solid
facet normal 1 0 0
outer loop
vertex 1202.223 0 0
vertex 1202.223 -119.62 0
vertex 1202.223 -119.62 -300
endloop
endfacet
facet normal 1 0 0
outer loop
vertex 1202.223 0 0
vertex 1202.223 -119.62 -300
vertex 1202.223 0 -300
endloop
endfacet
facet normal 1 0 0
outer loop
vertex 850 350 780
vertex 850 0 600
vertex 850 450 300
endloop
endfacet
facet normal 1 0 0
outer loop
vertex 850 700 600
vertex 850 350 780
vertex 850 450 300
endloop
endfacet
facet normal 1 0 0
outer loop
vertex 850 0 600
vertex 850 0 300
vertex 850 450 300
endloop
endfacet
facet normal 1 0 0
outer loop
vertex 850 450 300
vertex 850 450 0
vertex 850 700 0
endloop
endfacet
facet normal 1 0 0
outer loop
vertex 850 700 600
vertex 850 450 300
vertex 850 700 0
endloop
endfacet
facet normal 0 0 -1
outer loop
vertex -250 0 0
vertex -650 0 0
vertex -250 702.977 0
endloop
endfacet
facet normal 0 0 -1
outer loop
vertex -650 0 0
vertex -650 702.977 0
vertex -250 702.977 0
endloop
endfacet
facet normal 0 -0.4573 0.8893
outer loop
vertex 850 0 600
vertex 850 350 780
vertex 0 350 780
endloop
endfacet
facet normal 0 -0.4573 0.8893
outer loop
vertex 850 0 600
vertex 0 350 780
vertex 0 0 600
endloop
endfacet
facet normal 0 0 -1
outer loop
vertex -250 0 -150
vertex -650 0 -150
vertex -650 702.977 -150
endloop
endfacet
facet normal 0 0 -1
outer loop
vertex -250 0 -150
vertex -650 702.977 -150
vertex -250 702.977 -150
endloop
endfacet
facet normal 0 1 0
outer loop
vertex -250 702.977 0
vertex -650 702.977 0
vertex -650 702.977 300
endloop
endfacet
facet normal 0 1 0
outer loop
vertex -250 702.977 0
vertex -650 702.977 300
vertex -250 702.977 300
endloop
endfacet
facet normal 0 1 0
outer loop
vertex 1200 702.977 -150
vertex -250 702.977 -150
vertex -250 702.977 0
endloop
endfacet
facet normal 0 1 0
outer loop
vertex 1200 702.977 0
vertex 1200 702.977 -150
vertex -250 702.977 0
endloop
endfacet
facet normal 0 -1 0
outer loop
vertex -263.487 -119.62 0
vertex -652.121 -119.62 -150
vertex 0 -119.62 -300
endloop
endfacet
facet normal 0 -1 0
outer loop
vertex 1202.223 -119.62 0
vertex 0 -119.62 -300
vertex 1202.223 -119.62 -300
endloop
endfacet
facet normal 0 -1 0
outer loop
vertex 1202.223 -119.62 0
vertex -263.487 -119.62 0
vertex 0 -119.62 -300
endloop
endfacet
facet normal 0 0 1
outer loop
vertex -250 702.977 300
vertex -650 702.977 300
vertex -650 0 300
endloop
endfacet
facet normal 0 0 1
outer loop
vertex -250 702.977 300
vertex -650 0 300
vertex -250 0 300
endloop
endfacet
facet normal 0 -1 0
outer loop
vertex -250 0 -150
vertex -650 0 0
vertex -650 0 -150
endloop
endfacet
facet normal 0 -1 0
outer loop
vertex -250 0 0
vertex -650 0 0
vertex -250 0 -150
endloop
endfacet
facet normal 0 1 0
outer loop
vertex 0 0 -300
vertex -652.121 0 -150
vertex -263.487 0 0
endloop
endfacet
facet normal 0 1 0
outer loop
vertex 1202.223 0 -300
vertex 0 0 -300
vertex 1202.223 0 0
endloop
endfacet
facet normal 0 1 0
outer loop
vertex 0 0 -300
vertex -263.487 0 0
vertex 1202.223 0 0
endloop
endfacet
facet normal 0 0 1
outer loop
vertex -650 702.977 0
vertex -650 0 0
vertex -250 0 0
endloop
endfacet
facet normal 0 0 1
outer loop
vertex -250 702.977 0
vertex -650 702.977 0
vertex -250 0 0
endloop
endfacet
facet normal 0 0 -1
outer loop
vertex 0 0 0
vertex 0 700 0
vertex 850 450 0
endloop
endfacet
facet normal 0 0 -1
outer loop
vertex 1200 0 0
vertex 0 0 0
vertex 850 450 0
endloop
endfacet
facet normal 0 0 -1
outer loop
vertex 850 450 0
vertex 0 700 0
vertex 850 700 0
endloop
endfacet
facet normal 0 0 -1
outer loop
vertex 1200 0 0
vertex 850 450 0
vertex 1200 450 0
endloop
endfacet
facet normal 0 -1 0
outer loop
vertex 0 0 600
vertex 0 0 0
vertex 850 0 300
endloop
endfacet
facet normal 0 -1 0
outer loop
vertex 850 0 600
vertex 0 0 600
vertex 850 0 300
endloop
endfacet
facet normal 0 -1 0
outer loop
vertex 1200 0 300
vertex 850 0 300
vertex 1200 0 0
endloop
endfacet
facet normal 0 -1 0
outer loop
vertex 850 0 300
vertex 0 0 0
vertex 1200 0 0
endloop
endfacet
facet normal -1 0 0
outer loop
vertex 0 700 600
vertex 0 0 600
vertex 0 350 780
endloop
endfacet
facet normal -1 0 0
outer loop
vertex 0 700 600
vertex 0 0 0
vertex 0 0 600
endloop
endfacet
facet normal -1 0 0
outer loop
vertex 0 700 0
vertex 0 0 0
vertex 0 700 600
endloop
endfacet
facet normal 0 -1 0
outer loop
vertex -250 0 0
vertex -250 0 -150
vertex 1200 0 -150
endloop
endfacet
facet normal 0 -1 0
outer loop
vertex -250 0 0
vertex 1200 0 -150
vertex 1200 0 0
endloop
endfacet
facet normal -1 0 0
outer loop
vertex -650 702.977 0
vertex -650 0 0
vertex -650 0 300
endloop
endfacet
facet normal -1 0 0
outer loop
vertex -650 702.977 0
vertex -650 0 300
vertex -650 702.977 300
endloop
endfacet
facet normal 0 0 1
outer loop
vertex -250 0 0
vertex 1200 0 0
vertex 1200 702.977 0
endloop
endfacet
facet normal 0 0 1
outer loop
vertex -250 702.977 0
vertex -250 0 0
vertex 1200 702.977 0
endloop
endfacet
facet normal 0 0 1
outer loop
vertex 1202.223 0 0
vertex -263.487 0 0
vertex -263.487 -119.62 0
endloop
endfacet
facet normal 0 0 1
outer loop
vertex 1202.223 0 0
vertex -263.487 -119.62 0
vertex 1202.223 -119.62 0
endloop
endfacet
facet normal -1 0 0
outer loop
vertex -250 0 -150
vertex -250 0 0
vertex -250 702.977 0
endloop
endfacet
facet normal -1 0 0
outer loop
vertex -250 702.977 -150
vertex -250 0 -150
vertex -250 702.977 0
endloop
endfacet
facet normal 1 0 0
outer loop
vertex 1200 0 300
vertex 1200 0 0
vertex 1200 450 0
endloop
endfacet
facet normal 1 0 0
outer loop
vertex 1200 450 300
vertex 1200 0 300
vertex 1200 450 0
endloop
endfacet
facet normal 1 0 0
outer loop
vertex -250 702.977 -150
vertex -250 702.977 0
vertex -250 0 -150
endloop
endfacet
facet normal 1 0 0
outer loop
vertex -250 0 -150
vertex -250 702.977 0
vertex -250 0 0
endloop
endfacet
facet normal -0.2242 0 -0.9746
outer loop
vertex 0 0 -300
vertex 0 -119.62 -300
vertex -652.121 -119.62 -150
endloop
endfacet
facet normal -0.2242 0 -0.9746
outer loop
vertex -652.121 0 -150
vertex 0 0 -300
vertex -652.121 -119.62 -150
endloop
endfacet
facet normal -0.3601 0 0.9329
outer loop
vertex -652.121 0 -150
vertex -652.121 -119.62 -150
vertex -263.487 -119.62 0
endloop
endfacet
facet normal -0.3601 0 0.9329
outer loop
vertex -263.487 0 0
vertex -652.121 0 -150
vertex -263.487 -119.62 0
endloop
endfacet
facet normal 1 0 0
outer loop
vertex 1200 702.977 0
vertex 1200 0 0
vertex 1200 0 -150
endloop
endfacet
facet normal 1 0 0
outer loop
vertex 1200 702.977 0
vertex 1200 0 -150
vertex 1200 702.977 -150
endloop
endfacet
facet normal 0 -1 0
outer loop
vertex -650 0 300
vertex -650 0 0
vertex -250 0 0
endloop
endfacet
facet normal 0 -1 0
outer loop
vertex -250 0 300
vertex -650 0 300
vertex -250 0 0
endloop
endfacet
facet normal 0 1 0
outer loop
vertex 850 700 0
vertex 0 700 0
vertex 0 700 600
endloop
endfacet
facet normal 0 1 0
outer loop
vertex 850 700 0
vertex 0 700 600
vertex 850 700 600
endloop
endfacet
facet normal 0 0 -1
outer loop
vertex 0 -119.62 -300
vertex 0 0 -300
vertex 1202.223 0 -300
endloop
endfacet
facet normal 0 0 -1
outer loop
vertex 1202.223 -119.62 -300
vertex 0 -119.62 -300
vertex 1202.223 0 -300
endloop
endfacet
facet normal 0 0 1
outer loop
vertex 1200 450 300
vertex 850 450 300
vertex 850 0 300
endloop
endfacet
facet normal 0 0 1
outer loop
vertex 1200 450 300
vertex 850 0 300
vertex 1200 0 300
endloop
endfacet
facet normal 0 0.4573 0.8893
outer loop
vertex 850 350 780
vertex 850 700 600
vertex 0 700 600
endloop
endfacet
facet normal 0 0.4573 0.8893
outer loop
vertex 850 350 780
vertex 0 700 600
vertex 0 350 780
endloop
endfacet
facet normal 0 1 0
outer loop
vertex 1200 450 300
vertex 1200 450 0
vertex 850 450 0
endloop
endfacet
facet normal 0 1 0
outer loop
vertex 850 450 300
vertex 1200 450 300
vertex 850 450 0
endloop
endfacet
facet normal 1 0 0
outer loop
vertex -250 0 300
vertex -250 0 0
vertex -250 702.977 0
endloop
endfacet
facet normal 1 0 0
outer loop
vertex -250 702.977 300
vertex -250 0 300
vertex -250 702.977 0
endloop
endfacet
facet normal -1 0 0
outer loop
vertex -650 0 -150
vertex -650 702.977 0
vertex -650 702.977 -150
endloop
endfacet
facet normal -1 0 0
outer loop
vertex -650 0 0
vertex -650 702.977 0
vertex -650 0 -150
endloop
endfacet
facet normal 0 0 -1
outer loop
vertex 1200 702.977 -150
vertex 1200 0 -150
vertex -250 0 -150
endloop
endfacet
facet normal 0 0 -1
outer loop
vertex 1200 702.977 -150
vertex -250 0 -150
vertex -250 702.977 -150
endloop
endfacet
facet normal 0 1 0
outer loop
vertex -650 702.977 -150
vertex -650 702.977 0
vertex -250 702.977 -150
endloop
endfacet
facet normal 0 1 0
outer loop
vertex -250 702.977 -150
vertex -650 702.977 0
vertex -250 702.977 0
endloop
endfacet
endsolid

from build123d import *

# Parameters (mm, degrees)
F0_W      = 400
F0_H      = 702.9774785042
F1_DEPTH  = 300
F2_DEPTH  = 300
F4_DEPTH  = 300
F5_W      = 850
F5_H      = 350
F6_DEPTH  = 180
F8_DEPTH  = 1000
F9_DEPTH  = 180
F10_DEPTH = 180
F11_DEPTH = 1000
F13_DEPTH = 10000
F14_W     = 1854.3438315392
F14_H     = 119.6197420359
F15_DEPTH = 300
F17_DEPTH = 200
F18_DEPTH = 200
F19_W     = 400
F19_H     = 702.9774785042
F20_DEPTH = 150
F21_W     = 702.9774785042
F21_H     = 150
F22_DEPTH = 1450


# Not quite as in the source:
# - a feature of the source that left no trace in its solid (it failed there, or was rolled back) is left out
# - a feature names something its author has since deleted; it is built from what else it names


with BuildPart() as f1:
    # F0 (on Top) → F1 (new body)
    with BuildSketch(Plane.XY):
        with Locations((-450, 351.4887392521)):
            Rectangle(F0_W, F0_H)
    extrude(amount=F1_DEPTH)

    # F16 (on face) → F18 (cut)
    with BuildSketch(Plane.XZ.offset(119.6197420359)):
        Polygon((0, -300), (-652.1208882332, -150), (-652.1208882332, -300), align=None)
        Polygon((-652.1208882332, 0), (-652.1208882332, -150), (-263.4871304035, 0), align=None)
    extrude(amount=-F18_DEPTH, mode=Mode.SUBTRACT)


with BuildPart() as f2:
    # F0 (on Top) → F2 (new body)
    with BuildSketch(Plane.XY):
        Polygon((0, 700), (0, 0), (1200, 0), (1200, 150.83758533), (1200, 450), (850, 450), (850, 700), align=None)
    extrude(amount=F2_DEPTH)

    # F3 (on face) → F4 (join)
    with BuildSketch(Plane.XY.offset(300)):
        Polygon((0, 700), (0, 0), (850, 0), (850, 450), (850, 700), align=None)
    extrude(amount=F4_DEPTH)

    # F5 (on face) → F6 (join)
    with BuildSketch(Plane.XY.offset(600)):
        with Locations((425, 175)):
            Rectangle(F5_W, F5_H)
    extrude(amount=F6_DEPTH)

    # F7 (on face) → F8 (cut)
    with BuildSketch(Plane(origin=(0, 0, 0), x_dir=(0, -1, 0), z_dir=(-1, 0, 0))):
        Polygon((0, 780), (-350, 780), (0, 600), align=None)
    extrude(amount=-F8_DEPTH, mode=Mode.SUBTRACT)

    # F5 (on face) → F9 (join)
    with BuildSketch(Plane.XY.offset(600)):
        with Locations((425, 525)):
            Rectangle(F5_W, F5_H)
    extrude(amount=F9_DEPTH)

    # F5 (on face) → F10 (join)
    with BuildSketch(Plane.XY.offset(600)):
        with Locations((425, 525)):
            Rectangle(F5_W, F5_H)
        with Locations((425, 175)):
            Rectangle(F5_W, F5_H)
    extrude(amount=F10_DEPTH)

    # F7 (on face) → F11 (cut)
    with BuildSketch(Plane(origin=(0, 0, 0), x_dir=(0, -1, 0), z_dir=(-1, 0, 0))):
        Polygon((0, 780), (-350, 780), (0, 600), align=None)
    extrude(amount=-F11_DEPTH, mode=Mode.SUBTRACT)

    # F12 (on face) → F13 (cut)
    with BuildSketch(Plane(origin=(0, 0, 0), x_dir=(0, -1, 0), z_dir=(-1, 0, 0))):
        Polygon((-700, 600), (-350, 780), (-700, 780), align=None)
    extrude(amount=-F13_DEPTH, mode=Mode.SUBTRACT)


with BuildPart() as f15:
    # F14 (on Top) → F15 (new body)
    with BuildSketch(Plane.XY):
        with Locations((275.0510275364, -59.8098710179)):
            Rectangle(F14_W, F14_H)
    extrude(amount=-F15_DEPTH)

    # F16 (on face) → F17 (cut)
    with BuildSketch(Plane.XZ.offset(119.6197420359)):
        Polygon((0, -300), (-652.1208882332, -150), (-652.1208882332, -300), align=None)
        Polygon((-652.1208882332, 0), (-652.1208882332, -150), (-263.4871304035, 0), align=None)
    extrude(amount=-F17_DEPTH, mode=Mode.SUBTRACT)


with BuildPart() as f20:
    # F19 (on face) → F20 (new body)
    with BuildSketch(Plane(origin=(0, 0, 0), x_dir=(1, 0, 0), z_dir=(0, 0, -1))):
        with Locations((-450, -351.4887392521)):
            Rectangle(F19_W, F19_H)
    extrude(amount=F20_DEPTH)


with BuildPart() as f22:
    # F21 (on face) → F22 (new body)
    with BuildSketch(Plane.YZ.offset(-250)):
        with Locations((351.4887392521, -75)):
            Rectangle(F21_W, F21_H)
    extrude(amount=F22_DEPTH)


solid = Compound([f1.part, f2.part, f15.part, f20.part, f22.part])
